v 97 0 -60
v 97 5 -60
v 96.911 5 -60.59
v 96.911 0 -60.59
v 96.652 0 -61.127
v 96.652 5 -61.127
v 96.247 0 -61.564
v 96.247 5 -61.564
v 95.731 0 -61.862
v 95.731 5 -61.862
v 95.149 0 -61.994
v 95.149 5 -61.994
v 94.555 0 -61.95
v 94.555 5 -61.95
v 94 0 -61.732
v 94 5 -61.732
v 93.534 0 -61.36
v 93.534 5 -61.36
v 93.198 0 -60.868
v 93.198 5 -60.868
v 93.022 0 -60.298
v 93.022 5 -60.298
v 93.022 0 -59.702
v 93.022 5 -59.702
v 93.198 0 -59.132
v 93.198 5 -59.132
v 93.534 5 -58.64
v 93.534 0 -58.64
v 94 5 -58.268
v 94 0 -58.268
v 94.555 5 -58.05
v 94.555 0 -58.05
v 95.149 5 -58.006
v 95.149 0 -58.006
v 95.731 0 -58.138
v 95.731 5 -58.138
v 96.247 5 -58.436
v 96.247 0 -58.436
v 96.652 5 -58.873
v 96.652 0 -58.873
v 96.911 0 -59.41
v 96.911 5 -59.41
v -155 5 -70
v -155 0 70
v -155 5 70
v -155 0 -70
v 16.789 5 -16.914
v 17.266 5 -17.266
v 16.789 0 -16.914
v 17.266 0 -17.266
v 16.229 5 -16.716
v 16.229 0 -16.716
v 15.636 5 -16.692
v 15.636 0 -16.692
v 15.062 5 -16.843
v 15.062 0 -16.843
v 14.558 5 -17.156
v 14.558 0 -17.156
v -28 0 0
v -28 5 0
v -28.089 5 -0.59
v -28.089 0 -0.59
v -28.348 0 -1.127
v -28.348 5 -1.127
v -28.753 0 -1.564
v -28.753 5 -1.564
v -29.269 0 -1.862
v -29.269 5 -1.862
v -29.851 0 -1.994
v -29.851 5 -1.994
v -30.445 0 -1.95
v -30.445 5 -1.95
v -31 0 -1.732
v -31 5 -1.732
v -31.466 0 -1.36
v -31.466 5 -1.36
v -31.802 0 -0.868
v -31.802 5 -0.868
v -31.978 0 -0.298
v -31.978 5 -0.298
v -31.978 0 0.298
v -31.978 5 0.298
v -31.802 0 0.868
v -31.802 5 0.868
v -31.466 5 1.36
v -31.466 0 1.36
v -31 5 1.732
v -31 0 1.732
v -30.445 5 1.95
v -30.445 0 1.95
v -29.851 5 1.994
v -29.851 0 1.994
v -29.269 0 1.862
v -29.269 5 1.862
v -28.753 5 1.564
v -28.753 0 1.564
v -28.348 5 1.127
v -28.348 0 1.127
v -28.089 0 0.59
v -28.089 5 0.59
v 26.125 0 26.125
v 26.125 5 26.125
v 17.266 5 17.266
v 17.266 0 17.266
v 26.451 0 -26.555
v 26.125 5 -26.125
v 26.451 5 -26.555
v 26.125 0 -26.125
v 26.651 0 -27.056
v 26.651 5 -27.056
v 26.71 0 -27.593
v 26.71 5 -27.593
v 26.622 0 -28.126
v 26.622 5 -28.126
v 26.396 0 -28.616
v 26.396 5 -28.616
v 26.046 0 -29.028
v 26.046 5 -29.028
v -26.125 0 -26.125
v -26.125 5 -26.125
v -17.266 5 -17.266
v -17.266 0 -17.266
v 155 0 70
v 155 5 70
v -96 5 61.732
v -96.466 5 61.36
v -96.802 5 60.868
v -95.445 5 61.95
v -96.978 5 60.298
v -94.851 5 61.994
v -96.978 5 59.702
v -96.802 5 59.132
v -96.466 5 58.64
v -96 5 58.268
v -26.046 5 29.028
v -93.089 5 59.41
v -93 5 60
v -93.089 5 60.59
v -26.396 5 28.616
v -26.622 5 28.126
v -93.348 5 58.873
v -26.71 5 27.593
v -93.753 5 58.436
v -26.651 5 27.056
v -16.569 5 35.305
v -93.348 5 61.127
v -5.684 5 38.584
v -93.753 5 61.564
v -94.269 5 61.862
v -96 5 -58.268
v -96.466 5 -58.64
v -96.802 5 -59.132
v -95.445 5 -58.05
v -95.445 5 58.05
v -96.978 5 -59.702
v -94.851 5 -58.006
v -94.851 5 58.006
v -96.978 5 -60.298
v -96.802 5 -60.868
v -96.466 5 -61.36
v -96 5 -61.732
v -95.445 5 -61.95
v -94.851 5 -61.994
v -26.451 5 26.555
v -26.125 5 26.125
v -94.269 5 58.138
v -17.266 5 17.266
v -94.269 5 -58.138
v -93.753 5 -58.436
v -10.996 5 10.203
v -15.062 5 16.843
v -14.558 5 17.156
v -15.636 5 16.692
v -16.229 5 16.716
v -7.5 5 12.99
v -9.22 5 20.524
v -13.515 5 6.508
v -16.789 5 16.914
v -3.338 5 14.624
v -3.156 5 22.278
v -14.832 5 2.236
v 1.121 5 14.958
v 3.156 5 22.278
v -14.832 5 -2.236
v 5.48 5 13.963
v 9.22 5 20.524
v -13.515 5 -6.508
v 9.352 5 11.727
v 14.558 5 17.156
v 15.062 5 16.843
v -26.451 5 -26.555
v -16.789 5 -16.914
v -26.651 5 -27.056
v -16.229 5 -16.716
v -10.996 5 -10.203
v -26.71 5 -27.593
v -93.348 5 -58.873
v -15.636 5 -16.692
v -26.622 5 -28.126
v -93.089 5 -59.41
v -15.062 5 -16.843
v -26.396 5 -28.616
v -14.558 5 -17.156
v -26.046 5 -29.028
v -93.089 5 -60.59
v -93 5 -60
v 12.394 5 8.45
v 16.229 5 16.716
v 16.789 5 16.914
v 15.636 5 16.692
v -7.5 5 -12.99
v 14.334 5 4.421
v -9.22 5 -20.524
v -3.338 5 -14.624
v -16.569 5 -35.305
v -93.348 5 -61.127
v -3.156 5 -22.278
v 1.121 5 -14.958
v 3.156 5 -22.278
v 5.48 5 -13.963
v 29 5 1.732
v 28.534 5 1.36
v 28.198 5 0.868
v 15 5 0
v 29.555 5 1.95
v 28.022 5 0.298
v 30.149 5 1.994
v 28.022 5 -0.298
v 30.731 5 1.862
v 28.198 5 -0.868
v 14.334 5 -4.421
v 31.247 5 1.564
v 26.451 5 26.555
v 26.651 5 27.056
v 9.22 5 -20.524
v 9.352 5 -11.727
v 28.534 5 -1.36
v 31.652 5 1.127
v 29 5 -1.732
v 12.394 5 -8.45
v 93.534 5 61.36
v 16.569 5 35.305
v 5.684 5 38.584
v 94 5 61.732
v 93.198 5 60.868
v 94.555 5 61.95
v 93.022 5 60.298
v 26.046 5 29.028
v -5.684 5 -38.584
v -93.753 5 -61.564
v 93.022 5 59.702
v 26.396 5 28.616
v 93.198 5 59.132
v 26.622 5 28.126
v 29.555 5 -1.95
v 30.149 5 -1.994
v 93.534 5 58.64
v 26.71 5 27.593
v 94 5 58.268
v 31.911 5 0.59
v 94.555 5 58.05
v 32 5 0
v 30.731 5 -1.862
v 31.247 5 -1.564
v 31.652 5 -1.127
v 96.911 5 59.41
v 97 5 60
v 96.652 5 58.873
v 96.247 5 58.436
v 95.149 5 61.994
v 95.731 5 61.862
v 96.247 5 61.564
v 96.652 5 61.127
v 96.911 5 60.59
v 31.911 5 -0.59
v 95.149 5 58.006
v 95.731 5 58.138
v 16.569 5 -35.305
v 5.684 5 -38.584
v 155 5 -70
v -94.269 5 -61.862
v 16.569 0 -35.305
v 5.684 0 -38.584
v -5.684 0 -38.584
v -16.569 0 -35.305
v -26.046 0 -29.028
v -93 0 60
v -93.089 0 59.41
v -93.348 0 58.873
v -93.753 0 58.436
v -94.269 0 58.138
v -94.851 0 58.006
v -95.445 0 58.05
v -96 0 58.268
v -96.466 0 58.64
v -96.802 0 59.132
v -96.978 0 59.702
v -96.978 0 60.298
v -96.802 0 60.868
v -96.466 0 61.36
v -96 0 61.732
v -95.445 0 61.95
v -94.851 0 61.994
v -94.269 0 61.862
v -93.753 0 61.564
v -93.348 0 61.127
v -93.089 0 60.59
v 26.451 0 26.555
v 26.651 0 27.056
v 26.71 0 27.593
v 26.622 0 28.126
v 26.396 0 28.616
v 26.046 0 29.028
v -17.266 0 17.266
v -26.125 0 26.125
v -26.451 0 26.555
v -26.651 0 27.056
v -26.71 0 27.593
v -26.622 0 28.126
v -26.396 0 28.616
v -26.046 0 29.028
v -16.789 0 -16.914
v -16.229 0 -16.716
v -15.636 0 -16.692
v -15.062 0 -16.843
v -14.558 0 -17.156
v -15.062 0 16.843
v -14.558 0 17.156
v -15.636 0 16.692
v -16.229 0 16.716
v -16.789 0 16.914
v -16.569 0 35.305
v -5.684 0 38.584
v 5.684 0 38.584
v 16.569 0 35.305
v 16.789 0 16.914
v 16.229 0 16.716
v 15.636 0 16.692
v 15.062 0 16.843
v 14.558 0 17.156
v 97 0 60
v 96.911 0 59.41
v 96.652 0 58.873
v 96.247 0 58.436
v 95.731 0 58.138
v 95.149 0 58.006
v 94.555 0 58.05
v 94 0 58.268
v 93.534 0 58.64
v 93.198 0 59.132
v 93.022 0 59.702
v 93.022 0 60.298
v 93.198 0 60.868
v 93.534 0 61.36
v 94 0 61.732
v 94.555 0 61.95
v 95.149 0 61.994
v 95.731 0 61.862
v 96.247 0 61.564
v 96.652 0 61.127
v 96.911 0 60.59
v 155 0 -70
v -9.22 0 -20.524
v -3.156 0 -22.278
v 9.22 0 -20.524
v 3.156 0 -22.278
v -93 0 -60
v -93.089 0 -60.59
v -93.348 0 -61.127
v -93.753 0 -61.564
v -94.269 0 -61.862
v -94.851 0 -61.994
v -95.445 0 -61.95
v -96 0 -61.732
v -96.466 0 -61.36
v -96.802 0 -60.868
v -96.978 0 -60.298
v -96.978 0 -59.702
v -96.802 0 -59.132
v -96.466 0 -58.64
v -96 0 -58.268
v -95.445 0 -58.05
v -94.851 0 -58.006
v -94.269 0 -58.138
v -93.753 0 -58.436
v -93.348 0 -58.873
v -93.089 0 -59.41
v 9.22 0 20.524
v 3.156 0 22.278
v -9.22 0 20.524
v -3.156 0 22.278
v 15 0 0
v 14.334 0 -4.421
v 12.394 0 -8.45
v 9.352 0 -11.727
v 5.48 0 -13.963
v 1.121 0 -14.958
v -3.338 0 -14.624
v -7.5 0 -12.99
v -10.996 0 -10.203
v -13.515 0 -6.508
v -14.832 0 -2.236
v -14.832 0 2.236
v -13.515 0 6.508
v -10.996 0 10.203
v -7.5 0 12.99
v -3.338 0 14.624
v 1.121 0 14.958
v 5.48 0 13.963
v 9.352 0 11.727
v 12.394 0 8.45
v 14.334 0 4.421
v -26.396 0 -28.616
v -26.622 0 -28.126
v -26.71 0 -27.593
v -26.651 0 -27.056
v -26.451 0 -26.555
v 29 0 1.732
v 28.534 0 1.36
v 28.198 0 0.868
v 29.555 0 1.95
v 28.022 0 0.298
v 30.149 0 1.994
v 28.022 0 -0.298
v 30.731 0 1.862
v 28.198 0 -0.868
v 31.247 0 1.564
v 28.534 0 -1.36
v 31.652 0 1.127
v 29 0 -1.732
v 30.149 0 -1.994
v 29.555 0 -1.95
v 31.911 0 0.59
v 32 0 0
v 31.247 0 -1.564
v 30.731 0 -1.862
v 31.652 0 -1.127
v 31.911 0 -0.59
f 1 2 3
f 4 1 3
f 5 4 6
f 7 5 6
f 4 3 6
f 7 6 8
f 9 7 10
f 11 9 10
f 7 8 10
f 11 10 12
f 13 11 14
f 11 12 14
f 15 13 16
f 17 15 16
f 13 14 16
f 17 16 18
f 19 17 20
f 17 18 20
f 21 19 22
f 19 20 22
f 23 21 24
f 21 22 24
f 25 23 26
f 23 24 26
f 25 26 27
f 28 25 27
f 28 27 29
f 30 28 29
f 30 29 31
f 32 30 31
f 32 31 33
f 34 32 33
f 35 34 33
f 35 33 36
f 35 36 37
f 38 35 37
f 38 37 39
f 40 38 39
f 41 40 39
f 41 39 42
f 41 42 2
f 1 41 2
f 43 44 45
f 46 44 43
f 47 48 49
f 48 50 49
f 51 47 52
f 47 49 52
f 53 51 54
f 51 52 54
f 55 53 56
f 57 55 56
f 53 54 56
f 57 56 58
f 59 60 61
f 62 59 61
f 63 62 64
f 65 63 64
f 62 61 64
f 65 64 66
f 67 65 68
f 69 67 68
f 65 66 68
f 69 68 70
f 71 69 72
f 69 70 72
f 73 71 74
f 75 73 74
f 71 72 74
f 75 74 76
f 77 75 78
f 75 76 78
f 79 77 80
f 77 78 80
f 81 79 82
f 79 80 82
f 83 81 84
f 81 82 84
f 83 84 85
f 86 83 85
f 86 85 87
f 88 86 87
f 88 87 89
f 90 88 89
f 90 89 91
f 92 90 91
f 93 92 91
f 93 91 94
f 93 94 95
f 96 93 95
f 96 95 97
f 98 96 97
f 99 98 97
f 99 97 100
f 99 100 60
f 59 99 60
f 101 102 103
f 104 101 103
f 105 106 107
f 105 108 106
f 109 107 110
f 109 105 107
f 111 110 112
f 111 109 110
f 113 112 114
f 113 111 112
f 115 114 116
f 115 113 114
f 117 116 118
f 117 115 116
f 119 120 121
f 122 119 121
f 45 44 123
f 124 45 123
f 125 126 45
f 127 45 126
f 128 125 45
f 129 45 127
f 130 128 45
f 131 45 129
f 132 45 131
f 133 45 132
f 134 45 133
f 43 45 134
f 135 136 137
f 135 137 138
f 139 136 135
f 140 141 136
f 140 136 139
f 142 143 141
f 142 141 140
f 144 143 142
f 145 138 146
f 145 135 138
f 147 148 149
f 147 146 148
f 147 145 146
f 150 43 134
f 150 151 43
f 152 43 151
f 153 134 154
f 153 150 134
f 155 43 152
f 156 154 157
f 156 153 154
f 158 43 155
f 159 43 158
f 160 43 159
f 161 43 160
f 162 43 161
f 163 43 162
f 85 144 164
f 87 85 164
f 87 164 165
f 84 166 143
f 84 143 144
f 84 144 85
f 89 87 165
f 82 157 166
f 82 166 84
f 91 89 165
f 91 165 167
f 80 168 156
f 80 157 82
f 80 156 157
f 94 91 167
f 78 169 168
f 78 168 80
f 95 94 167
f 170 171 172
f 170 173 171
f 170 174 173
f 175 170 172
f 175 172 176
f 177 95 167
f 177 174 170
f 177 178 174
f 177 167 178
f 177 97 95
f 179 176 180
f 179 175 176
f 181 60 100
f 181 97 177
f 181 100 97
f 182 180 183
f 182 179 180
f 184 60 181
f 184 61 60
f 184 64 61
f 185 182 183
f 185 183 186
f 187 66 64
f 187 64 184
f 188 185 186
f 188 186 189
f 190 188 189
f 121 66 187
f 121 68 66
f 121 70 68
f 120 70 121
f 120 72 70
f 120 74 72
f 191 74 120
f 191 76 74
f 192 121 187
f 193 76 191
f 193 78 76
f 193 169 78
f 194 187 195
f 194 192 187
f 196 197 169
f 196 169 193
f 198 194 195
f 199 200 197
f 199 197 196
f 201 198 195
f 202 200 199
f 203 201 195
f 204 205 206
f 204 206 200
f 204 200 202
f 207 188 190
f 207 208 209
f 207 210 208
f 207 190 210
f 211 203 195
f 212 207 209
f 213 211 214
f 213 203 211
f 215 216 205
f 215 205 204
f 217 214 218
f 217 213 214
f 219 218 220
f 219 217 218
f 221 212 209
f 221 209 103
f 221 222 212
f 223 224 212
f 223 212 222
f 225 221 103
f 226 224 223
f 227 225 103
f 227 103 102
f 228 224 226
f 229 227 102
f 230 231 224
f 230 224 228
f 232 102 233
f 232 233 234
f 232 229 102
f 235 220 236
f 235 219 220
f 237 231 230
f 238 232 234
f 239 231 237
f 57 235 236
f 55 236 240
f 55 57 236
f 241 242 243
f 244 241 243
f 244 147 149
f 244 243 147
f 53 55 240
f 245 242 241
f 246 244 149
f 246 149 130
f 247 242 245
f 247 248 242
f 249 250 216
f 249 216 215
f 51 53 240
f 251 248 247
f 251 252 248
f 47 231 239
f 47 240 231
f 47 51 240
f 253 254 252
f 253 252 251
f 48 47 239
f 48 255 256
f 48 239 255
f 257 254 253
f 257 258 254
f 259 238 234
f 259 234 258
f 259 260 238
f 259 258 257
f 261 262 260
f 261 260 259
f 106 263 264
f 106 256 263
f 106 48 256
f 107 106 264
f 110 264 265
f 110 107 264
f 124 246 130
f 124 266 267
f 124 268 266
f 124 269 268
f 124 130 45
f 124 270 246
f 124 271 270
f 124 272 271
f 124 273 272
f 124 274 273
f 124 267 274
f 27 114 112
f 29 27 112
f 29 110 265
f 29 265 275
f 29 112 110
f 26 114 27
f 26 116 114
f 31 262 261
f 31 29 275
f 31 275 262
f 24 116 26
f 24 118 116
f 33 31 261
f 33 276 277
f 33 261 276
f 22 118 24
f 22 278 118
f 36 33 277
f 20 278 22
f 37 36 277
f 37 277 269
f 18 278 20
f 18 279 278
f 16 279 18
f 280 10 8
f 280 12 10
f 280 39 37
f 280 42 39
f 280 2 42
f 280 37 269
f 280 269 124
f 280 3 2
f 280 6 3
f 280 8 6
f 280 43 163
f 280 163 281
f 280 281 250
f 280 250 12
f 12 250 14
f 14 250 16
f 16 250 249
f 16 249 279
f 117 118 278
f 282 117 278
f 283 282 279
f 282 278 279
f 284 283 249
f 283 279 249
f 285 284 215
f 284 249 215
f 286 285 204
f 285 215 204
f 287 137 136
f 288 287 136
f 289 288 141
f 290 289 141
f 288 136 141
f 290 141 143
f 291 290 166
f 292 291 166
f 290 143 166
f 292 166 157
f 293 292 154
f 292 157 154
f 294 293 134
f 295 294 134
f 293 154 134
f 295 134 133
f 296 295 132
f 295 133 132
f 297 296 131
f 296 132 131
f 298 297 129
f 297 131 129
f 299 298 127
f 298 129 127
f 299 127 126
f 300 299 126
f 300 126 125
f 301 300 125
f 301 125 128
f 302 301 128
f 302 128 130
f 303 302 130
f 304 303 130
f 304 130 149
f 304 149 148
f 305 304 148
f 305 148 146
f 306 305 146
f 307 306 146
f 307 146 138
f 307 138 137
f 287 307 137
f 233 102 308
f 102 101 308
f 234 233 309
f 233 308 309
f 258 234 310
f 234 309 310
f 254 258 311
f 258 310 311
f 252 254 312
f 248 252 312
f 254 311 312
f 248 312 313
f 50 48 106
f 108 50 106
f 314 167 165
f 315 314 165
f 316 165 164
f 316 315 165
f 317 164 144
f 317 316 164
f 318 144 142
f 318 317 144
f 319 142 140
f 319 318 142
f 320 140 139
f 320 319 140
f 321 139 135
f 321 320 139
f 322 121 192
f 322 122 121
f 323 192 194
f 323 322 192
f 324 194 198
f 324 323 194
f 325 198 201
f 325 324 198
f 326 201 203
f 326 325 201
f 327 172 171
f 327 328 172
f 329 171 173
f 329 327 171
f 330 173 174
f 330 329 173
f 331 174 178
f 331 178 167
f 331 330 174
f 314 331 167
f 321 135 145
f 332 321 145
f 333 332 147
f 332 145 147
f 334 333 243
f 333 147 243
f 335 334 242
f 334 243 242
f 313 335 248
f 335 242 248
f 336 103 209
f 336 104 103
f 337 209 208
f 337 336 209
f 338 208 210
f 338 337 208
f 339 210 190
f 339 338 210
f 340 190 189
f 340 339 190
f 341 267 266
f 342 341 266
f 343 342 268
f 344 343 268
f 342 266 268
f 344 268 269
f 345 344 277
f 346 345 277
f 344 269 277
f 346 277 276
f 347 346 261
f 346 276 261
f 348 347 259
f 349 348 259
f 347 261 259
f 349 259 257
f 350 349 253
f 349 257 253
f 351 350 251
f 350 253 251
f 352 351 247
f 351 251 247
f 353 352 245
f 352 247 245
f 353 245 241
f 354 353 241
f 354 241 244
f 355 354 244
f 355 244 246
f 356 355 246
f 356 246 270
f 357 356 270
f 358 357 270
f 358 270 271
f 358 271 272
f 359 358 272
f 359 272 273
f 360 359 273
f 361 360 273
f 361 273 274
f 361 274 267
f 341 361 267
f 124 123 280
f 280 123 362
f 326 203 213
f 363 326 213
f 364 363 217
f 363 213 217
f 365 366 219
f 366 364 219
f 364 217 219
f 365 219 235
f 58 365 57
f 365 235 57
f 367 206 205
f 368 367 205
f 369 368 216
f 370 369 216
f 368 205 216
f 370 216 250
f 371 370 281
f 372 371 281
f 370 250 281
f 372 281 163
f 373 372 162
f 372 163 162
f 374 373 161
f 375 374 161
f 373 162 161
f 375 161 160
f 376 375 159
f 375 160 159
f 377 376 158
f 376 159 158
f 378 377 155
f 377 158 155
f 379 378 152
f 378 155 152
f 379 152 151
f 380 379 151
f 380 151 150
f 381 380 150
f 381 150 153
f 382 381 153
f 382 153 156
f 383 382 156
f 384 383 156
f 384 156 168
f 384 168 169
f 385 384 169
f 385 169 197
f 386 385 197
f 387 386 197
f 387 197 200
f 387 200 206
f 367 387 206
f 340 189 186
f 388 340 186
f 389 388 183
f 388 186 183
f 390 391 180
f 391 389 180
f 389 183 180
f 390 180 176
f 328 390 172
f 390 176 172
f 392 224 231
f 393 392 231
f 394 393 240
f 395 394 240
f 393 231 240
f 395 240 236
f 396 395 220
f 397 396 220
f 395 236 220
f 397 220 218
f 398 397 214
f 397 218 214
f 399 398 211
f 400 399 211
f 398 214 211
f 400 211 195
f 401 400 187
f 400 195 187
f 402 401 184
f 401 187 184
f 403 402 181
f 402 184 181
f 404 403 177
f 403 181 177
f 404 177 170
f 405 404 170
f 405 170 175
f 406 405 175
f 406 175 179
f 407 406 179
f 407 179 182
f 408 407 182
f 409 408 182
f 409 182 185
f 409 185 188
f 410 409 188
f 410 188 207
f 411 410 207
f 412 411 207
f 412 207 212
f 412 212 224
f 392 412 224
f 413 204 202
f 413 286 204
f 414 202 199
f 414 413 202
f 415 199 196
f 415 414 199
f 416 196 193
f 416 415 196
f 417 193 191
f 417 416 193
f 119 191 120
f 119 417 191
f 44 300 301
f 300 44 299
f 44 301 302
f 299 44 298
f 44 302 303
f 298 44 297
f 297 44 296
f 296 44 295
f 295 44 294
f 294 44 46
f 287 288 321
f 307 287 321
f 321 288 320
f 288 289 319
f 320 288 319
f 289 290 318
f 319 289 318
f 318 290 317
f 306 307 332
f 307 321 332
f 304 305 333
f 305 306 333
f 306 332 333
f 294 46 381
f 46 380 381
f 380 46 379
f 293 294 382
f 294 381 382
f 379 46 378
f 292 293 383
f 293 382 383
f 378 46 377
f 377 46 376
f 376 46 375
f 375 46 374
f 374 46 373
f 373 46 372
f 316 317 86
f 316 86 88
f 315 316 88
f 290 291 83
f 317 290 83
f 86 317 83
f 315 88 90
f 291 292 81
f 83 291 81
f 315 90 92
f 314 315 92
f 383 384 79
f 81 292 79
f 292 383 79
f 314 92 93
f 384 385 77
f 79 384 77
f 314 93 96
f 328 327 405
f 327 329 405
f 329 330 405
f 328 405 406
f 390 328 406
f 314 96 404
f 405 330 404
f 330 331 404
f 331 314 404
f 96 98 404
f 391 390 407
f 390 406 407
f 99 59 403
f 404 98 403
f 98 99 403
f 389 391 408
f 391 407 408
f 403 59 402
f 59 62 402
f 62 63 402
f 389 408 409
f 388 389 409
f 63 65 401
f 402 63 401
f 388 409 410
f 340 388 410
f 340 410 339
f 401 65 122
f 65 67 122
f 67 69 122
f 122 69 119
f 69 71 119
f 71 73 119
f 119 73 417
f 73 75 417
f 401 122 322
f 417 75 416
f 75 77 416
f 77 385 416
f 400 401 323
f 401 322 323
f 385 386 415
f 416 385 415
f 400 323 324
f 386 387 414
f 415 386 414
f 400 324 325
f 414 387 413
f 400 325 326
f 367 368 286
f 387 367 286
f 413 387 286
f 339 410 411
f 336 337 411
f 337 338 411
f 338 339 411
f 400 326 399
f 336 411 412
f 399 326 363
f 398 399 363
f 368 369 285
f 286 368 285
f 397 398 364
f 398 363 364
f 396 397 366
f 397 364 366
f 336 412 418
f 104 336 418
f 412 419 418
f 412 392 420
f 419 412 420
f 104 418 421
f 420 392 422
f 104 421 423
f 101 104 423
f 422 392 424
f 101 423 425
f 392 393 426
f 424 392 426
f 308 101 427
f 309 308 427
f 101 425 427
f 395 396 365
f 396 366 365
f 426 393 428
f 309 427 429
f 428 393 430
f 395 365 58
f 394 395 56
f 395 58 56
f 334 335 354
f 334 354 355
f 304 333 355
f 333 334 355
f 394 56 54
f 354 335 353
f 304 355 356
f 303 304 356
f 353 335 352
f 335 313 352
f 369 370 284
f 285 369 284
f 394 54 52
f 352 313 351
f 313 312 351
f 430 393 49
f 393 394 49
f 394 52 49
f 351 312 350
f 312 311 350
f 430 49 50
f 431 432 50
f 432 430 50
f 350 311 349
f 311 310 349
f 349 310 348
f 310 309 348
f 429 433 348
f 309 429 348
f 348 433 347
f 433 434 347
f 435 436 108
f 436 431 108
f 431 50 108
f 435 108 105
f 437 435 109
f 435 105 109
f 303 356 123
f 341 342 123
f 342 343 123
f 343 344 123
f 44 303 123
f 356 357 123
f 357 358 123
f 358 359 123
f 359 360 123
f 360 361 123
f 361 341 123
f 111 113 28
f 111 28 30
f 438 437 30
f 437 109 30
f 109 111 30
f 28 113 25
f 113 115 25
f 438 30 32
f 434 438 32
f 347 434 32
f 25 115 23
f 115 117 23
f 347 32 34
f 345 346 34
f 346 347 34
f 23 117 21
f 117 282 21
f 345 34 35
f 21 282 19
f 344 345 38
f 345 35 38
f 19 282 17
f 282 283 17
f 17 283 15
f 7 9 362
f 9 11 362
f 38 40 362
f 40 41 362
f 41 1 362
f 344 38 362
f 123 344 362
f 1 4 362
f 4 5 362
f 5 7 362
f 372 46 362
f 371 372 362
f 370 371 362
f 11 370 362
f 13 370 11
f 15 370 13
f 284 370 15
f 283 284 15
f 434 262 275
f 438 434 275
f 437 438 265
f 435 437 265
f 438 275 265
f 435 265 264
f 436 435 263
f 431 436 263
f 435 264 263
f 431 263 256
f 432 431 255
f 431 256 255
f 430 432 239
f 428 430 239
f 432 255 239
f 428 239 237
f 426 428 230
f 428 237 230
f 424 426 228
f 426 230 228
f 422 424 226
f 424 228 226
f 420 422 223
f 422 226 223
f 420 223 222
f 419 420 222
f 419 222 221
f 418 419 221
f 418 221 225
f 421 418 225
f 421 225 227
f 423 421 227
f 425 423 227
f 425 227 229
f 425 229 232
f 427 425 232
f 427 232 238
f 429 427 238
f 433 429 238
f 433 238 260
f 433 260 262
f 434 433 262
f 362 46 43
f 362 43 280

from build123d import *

# Parameters (mm, degrees)
SKETCH2_W           = 310
SKETCH2_H           = 140
BOSS_EXTRUDE1_DEPTH = 5
SKETCH3_R           = 15
CUT_EXTRUDE1_DEPTH  = 6
SKETCH5_R           = 2
CUT_EXTRUDE2_DEPTH  = 6
CUT_EXTRUDE3_DEPTH  = 10
FILLET1_R           = 2
SKETCH7_R           = 2
CUT_EXTRUDE4_DEPTH  = 6


with BuildPart() as part:
    # Sketch2 → Boss-Extrude1 (new body)
    with BuildSketch(Plane(origin=(0, 0, 0), x_dir=(1, 0, 0), z_dir=(0, 1, 0))):
        Rectangle(SKETCH2_W, SKETCH2_H)
    extrude(amount=BOSS_EXTRUDE1_DEPTH)

    # Sketch3 → Cut-Extrude1 (cut, through all)
    with BuildSketch(Plane(origin=(0, 5, 0), x_dir=(1, 0, 0), z_dir=(0, 1, 0))):
        Circle(SKETCH3_R)
    extrude(amount=-CUT_EXTRUDE1_DEPTH, mode=Mode.SUBTRACT)

    # Sketch5 → Cut-Extrude2 (cut, through all)
    with BuildSketch(Plane(origin=(0, 5, 0), x_dir=(1, 0, 0), z_dir=(0, 1, 0))):
        with Locations((-95, 60)):
            Circle(SKETCH5_R)
        with Locations((95, 60)):
            Circle(SKETCH5_R)
        with Locations((95, -60)):
            Circle(SKETCH5_R)
        with Locations((-95, -60)):
            Circle(SKETCH5_R)
    extrude(amount=-CUT_EXTRUDE2_DEPTH, mode=Mode.SUBTRACT)

    # Sketch6 → Cut-Extrude3 (cut)
    with BuildSketch(Plane(origin=(0, 5, 0), x_dir=(1, 0, 0), z_dir=(0, 1, 0))):
        with BuildLine():
            Line((27.577164466, -27.577164466), (15.909902577, -15.909902577))
            ThreePointArc((15.909902577, -15.909902577), (0, -22.5), (-15.909902577, -15.909902577))
            Line((-15.909902577, -15.909902577), (-27.577164466, -27.577164466))
            ThreePointArc((-27.577164466, -27.577164466), (0, -39), (27.577164466, -27.577164466))
        make_face()
        with BuildLine():
            ThreePointArc((-15.909902577, 15.909902577), (0, 22.5), (15.909902577, 15.909902577))
            Line((15.909902577, 15.909902577), (27.577164466, 27.577164466))
            ThreePointArc((27.577164466, 27.577164466), (0, 39), (-27.577164466, 27.577164466))
            Line((-27.577164466, 27.577164466), (-15.909902577, 15.909902577))
        make_face()
    extrude(amount=-CUT_EXTRUDE3_DEPTH, mode=Mode.SUBTRACT)

    # Fillet1
    fillet1_edges = [part.edges().sort_by_distance(p)[0] for p in [
        (-15.909902577, 2.5, 15.909902577),
        (15.909902577, 2.5, 15.909902577),
        (27.577164466, 2.5, 27.577164466),
        (-27.577164466, 2.5, 27.577164466),
        (15.909902577, 2.5, -15.909902577),
        (-15.909902577, 2.5, -15.909902577),
        (-27.577164466, 2.5, -27.577164466),
        (27.577164466, 2.5, -27.577164466),
    ]]
    fillet(fillet1_edges, radius=FILLET1_R)

    # Sketch7 → Cut-Extrude4 (cut, through all)
    with BuildSketch(Plane(origin=(0, 5, 0), x_dir=(1, 0, 0), z_dir=(0, 1, 0))):
        with Locations((-30, 0)):
            Circle(SKETCH7_R)
        with Locations((30, 0)):
            Circle(SKETCH7_R)
    extrude(amount=-CUT_EXTRUDE4_DEPTH, mode=Mode.SUBTRACT)


solid = part.part
